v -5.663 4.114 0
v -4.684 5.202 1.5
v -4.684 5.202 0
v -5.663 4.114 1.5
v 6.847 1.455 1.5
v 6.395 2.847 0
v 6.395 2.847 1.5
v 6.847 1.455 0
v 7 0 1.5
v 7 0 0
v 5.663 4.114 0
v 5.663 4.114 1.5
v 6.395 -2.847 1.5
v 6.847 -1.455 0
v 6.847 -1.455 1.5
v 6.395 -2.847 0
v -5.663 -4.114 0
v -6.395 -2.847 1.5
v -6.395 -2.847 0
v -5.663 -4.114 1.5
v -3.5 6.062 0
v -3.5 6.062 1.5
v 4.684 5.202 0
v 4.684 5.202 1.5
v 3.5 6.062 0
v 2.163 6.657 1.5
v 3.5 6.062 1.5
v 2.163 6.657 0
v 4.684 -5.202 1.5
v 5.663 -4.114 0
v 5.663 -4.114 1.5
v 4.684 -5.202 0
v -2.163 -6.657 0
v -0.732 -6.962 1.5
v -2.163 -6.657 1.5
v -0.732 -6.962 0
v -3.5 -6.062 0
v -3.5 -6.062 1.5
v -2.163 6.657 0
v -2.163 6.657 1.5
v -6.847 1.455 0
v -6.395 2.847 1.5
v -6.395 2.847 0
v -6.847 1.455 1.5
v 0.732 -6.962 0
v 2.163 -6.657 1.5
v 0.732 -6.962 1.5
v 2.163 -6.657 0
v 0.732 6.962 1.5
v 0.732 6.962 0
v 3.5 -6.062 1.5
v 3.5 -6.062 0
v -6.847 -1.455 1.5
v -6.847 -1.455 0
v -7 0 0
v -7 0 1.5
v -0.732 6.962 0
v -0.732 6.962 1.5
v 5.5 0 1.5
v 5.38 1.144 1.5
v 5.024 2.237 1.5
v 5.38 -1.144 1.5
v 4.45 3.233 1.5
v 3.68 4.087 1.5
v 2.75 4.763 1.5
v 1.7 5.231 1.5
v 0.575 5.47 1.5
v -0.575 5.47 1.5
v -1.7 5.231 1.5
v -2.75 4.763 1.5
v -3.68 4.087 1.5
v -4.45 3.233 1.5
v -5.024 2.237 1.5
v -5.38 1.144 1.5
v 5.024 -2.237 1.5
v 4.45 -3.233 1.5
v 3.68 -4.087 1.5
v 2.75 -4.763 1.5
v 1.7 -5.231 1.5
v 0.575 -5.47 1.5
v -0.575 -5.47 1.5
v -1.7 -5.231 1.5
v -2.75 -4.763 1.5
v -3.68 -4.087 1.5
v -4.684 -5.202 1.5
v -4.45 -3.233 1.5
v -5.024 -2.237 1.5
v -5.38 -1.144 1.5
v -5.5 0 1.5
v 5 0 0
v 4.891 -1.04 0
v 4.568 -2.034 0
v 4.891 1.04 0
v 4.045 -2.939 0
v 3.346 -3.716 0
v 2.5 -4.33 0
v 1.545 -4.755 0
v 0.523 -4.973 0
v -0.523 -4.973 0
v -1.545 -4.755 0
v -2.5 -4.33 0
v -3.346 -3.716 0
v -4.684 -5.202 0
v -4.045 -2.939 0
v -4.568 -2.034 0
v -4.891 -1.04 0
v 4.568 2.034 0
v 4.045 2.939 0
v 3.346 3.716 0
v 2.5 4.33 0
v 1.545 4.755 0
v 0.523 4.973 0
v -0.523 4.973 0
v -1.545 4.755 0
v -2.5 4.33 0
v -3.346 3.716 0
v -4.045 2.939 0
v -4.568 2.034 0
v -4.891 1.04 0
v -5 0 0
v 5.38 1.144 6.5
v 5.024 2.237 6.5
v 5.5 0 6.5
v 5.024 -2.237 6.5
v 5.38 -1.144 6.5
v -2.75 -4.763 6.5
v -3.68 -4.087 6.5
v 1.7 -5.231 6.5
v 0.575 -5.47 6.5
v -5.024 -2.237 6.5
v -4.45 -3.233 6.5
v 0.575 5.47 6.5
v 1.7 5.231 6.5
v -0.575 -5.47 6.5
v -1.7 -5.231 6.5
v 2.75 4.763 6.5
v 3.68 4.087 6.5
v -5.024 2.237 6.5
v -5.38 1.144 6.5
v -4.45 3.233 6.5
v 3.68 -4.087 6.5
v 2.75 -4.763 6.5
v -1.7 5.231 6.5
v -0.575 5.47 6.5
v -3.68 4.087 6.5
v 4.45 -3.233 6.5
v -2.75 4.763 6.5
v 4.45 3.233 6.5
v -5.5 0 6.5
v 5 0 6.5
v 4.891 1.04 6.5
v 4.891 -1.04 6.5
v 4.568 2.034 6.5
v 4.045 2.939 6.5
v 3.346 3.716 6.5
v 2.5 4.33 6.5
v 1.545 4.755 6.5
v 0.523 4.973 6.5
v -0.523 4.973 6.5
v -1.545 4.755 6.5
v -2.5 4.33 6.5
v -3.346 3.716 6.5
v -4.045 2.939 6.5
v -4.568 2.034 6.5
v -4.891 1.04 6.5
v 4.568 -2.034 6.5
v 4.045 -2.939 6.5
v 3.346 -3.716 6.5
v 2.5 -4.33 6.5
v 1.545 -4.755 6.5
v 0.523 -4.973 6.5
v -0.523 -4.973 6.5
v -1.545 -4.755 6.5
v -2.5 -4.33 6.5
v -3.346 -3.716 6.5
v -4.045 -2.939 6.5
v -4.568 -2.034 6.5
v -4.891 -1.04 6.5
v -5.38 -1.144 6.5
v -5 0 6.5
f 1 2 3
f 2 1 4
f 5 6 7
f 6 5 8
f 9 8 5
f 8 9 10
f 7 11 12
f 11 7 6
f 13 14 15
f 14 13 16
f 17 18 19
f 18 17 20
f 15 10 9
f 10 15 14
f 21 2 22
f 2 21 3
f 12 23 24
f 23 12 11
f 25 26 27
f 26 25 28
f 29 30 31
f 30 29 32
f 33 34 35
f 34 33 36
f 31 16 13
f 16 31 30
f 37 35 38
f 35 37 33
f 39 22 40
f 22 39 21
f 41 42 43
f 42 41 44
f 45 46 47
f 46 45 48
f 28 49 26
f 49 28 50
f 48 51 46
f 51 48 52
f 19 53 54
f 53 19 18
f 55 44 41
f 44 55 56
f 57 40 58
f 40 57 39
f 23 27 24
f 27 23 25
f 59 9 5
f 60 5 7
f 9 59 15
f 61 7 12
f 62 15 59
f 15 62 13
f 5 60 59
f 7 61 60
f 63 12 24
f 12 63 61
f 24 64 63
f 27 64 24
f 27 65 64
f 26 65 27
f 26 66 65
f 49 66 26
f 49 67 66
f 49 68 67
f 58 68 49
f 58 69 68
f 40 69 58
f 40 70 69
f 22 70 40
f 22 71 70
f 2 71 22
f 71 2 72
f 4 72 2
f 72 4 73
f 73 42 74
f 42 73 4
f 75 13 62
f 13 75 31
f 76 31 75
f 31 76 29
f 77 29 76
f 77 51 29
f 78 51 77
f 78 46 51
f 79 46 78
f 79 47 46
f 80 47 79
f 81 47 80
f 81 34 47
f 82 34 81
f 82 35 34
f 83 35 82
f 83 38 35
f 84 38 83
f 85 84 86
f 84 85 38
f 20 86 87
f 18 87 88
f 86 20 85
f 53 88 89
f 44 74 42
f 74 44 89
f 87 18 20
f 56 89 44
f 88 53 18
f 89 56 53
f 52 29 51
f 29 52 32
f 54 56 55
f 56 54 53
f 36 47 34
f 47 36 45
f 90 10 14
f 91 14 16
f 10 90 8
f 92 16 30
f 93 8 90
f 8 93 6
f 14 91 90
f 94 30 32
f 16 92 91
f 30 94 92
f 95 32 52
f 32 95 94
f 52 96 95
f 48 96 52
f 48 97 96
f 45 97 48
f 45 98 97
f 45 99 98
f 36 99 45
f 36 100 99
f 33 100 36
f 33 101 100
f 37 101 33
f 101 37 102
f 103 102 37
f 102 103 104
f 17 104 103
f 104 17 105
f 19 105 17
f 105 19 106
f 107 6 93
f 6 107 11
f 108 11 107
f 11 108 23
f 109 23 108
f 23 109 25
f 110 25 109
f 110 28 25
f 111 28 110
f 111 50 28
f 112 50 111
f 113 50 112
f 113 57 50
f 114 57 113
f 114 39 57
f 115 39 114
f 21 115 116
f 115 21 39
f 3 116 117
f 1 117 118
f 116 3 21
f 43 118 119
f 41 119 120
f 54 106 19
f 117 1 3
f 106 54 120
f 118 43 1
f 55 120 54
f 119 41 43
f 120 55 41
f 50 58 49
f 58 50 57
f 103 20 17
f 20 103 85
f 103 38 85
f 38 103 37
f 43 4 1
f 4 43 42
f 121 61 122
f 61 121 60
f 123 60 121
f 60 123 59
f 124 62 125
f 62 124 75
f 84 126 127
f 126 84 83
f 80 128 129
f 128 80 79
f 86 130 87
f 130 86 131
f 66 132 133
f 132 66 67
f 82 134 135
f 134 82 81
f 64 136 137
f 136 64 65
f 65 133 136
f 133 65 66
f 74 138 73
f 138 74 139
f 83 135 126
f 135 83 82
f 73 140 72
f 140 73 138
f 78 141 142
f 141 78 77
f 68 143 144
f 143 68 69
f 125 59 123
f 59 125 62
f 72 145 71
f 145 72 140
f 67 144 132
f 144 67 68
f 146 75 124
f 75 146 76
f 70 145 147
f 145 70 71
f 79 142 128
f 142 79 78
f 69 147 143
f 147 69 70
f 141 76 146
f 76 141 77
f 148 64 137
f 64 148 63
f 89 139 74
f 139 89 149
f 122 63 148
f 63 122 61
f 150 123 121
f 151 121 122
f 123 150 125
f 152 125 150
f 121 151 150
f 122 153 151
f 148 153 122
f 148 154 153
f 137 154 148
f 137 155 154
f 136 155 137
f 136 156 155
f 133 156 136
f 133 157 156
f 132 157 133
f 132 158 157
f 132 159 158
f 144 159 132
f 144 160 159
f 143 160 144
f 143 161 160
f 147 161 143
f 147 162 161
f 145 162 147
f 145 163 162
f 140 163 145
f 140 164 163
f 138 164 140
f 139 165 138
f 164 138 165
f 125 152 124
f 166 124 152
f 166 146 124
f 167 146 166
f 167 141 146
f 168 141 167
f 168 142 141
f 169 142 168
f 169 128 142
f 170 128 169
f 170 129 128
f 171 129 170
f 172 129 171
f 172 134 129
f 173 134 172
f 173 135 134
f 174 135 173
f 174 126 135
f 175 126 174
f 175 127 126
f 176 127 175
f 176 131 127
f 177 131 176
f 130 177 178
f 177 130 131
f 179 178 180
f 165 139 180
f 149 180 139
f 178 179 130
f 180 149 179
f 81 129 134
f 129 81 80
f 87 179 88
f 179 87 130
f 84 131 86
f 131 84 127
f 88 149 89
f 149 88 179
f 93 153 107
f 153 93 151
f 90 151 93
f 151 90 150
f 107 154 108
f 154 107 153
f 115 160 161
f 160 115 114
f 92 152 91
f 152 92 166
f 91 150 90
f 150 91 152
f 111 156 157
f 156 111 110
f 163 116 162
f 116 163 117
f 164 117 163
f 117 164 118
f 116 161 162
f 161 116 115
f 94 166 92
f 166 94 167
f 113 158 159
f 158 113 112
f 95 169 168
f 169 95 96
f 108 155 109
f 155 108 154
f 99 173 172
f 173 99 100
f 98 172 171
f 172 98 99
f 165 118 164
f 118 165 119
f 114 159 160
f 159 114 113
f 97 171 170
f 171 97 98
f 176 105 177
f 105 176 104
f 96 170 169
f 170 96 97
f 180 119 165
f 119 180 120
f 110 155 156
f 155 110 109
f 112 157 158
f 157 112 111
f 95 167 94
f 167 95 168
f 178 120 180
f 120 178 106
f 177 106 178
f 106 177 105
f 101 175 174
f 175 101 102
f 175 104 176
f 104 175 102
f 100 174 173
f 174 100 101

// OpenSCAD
/*
 * Simple Flange 
 *
 * by Alex Franke (CodeCreations), Apr 2012
 * http://www.theFrankes.com
 * 
 * Licenced under Creative Commons Attribution - Non-Commercial - Share Alike 3.0 
 * 
 * INSTRUCTIONS: Choose some values in the "User-defined values" section, render, print, smile
 *     broadly, share with friends, and send the author a few bottles of your favorite beer. 
 *
 * v1.00, Apr 26, 2012: Initial release. This was inspired by my broken towel hoop... so might 
 *     as well make it an official "thing!" :) 
 */

totalHeight = 6.5; 		// Total height of object
bodyDiameter = 11; 		// Diameter of body
flangeHeight = 1.5; 		// Diameter of the bottom part that juts out
flangeWidth = 1.5; 		// Distance that the bottom part juts out
internalDiameter = 10; 	// Diameter of the hole in the middle 
holeDepth = 7; 			// Depth of the hole in the middle, from the bottom

$fn=30;

flange( totalHeight, bodyDiameter, flangeHeight, flangeWidth, internalDiameter, holeDepth ); 

module flange(
	totalHeight = 6.5,
	bodyDiameter = 11,
	flangeHeight = 1.5,
	flangeWidth = 1.5,
	internalDiameter = 10,
	holeDepth = 5.5
) {
	difference() {
		union() {
	
			// Flange
			cylinder(h=flangeHeight, r=bodyDiameter/2+flangeWidth);
	
			// Body 
			translate([0,0,flangeHeight])
				cylinder(h=totalHeight-flangeHeight, r=bodyDiameter/2);
		}
	
		// Hole 
		cylinder(h=holeDepth, r=internalDiameter/2);
	}
}
	
